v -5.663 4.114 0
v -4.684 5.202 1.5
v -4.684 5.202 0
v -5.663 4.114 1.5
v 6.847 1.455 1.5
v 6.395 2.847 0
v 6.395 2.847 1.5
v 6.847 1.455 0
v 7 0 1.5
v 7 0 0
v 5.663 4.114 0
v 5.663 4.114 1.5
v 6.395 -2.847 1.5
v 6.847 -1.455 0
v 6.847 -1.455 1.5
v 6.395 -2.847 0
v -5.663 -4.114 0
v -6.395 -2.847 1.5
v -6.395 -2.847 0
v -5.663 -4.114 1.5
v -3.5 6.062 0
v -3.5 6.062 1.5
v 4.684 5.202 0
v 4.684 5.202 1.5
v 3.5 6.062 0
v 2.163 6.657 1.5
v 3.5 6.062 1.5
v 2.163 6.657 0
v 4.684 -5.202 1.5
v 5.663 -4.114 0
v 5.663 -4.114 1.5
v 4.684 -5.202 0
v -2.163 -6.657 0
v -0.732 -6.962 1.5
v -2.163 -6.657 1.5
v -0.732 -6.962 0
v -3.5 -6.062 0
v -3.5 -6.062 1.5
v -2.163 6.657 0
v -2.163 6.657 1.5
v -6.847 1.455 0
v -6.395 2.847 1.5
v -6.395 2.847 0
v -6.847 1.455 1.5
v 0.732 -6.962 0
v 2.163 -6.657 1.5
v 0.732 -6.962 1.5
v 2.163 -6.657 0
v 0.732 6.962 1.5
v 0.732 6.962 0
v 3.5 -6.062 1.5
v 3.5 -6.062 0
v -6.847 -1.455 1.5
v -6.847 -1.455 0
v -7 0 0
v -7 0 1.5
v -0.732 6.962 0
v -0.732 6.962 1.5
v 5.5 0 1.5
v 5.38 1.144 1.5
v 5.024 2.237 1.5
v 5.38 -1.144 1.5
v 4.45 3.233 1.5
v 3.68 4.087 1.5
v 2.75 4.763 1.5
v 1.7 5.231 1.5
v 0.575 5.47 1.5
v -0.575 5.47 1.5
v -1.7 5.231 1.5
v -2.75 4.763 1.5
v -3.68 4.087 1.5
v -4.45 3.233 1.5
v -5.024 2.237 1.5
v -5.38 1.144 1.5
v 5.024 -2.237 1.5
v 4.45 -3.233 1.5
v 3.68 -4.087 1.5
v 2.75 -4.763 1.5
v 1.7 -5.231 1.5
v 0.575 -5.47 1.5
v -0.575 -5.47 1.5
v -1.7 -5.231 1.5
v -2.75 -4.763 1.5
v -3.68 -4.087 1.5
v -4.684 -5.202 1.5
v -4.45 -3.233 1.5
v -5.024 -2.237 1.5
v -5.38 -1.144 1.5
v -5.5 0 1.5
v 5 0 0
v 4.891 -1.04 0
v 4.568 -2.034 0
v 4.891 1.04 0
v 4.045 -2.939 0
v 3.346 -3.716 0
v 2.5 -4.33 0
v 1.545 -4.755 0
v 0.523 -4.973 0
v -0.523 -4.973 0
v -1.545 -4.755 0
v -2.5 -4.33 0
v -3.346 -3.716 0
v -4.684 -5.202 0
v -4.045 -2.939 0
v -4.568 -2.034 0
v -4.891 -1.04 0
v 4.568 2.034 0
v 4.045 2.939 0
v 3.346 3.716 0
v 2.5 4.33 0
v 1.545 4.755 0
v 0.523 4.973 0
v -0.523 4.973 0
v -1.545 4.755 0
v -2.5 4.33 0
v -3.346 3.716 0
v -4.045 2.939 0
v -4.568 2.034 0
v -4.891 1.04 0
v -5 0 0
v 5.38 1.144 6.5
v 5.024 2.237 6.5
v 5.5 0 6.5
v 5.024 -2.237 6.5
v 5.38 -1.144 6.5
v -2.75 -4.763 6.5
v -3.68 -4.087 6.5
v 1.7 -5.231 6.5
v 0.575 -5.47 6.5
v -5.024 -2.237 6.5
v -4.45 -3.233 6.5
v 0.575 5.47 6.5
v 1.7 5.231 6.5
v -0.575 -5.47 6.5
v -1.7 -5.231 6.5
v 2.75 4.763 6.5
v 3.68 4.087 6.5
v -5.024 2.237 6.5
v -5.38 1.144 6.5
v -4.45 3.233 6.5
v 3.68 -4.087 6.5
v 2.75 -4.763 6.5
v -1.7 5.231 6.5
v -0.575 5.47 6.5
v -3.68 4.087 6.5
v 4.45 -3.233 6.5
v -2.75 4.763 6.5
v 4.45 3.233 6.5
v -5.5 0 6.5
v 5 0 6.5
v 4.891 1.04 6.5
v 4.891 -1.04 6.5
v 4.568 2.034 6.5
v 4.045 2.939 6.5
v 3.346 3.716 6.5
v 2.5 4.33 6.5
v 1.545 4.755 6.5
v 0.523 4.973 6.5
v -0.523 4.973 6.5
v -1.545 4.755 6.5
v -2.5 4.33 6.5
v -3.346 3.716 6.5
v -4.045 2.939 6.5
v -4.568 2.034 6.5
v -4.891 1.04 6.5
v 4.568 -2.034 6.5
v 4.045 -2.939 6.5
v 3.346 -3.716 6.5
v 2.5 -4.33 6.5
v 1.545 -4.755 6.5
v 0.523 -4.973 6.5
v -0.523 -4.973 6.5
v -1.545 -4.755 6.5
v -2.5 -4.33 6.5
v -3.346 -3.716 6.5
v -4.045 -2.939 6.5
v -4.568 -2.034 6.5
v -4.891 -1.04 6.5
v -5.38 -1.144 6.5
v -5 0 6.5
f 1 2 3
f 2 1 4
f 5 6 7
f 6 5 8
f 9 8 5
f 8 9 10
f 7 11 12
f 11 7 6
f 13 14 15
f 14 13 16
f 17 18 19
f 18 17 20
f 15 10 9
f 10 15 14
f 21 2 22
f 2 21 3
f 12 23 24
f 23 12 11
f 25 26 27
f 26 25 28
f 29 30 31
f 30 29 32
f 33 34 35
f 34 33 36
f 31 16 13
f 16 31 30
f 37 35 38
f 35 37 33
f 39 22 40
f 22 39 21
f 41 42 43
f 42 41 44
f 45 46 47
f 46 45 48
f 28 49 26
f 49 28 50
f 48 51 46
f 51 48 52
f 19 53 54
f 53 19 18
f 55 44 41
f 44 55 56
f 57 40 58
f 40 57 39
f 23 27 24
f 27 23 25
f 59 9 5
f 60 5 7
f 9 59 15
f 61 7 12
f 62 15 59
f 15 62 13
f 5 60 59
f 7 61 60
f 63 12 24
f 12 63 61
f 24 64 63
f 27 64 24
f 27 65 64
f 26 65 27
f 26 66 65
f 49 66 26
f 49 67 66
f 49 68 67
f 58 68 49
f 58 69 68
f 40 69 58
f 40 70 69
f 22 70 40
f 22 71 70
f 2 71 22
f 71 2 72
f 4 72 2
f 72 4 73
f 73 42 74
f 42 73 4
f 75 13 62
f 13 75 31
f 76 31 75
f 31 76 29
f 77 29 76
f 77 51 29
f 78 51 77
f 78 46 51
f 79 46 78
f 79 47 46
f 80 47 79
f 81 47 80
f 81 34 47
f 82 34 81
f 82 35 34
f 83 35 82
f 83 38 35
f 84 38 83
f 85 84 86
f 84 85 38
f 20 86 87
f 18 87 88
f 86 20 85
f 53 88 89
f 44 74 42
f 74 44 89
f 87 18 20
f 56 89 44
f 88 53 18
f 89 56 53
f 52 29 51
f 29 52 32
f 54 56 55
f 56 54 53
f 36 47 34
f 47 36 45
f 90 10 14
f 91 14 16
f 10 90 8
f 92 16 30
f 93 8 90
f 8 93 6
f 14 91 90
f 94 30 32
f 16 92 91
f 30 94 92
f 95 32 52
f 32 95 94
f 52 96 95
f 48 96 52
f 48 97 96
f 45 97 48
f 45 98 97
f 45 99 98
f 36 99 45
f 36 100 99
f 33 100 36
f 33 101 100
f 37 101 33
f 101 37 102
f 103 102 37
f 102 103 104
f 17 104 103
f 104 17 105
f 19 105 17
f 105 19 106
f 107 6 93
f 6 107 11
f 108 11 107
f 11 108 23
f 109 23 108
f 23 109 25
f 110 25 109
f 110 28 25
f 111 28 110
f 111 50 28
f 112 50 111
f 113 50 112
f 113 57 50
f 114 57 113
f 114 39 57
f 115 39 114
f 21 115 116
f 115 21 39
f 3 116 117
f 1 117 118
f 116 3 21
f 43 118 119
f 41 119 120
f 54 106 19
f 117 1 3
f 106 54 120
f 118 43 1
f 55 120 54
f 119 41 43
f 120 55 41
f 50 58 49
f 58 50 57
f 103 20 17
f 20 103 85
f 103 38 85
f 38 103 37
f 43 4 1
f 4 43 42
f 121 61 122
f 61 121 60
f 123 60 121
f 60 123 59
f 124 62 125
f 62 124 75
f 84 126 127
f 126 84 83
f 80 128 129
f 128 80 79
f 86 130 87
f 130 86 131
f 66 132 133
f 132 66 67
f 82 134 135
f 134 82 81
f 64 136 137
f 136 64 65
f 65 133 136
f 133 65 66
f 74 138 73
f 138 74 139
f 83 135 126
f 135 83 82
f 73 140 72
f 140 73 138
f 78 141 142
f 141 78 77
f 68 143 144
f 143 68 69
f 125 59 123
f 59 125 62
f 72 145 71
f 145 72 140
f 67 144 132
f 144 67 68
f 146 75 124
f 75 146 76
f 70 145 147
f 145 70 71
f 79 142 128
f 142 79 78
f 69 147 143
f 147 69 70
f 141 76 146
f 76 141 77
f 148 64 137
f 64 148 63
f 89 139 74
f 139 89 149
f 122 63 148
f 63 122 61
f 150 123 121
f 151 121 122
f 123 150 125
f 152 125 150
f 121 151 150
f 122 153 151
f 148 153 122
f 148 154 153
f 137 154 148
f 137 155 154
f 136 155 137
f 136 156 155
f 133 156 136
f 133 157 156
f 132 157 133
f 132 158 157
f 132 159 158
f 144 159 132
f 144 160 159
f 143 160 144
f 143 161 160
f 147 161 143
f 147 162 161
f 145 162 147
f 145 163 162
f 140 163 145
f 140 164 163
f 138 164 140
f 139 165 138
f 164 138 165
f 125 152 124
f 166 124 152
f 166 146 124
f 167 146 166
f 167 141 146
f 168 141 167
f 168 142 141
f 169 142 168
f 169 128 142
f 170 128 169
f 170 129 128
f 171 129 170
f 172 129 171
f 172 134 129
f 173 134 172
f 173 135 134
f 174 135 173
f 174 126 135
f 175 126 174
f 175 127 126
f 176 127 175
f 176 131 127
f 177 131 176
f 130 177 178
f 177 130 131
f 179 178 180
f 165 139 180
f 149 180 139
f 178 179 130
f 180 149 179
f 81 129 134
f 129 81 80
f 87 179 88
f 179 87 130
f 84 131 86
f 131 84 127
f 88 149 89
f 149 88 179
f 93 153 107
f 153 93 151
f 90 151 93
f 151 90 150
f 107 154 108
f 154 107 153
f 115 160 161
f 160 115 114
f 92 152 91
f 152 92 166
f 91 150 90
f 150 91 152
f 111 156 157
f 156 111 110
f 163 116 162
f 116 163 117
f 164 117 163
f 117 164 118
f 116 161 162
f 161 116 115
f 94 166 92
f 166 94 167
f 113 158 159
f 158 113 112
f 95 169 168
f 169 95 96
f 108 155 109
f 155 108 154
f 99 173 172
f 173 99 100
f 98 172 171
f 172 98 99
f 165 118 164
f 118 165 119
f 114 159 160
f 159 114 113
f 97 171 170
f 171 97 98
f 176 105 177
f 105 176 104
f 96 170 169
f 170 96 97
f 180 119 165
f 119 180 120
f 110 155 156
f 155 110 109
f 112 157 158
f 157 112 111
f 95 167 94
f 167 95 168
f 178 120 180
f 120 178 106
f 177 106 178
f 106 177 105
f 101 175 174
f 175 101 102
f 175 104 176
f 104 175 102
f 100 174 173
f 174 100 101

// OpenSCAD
/*
 * Simple Flange 
 *
 * by Alex Franke (CodeCreations), Apr 2012
 * http://www.theFrankes.com
 * 
 * Licenced under Creative Commons Attribution - Non-Commercial - Share Alike 3.0 
 * 
 * INSTRUCTIONS: Choose some values in the "User-defined values" section, render, print, smile
 *     broadly, share with friends, and send the author a few bottles of your favorite beer. 
 *
 * v1.00, Apr 26, 2012: Initial release. This was inspired by my broken towel hoop... so might 
 *     as well make it an official "thing!" :) 
 */

totalHeight = 6.5; 		// Total height of object
bodyDiameter = 11; 		// Diameter of body
flangeHeight = 1.5; 		// Diameter of the bottom part that juts out
flangeWidth = 1.5; 		// Distance that the bottom part juts out
internalDiameter = 10; 	// Diameter of the hole in the middle 
holeDepth = 7; 			// Depth of the hole in the middle, from the bottom

$fn=30;

flange( totalHeight, bodyDiameter, flangeHeight, flangeWidth, internalDiameter, holeDepth ); 

module flange(
	totalHeight = 6.5,
	bodyDiameter = 11,
	flangeHeight = 1.5,
	flangeWidth = 1.5,
	internalDiameter = 10,
	holeDepth = 5.5
) {
	difference() {
		union() {
	
			// Flange
			cylinder(h=flangeHeight, r=bodyDiameter/2+flangeWidth);
	
			// Body 
			translate([0,0,flangeHeight])
				cylinder(h=totalHeight-flangeHeight, r=bodyDiameter/2);
		}
	
		// Hole 
		cylinder(h=holeDepth, r=internalDiameter/2);
	}
}
	
